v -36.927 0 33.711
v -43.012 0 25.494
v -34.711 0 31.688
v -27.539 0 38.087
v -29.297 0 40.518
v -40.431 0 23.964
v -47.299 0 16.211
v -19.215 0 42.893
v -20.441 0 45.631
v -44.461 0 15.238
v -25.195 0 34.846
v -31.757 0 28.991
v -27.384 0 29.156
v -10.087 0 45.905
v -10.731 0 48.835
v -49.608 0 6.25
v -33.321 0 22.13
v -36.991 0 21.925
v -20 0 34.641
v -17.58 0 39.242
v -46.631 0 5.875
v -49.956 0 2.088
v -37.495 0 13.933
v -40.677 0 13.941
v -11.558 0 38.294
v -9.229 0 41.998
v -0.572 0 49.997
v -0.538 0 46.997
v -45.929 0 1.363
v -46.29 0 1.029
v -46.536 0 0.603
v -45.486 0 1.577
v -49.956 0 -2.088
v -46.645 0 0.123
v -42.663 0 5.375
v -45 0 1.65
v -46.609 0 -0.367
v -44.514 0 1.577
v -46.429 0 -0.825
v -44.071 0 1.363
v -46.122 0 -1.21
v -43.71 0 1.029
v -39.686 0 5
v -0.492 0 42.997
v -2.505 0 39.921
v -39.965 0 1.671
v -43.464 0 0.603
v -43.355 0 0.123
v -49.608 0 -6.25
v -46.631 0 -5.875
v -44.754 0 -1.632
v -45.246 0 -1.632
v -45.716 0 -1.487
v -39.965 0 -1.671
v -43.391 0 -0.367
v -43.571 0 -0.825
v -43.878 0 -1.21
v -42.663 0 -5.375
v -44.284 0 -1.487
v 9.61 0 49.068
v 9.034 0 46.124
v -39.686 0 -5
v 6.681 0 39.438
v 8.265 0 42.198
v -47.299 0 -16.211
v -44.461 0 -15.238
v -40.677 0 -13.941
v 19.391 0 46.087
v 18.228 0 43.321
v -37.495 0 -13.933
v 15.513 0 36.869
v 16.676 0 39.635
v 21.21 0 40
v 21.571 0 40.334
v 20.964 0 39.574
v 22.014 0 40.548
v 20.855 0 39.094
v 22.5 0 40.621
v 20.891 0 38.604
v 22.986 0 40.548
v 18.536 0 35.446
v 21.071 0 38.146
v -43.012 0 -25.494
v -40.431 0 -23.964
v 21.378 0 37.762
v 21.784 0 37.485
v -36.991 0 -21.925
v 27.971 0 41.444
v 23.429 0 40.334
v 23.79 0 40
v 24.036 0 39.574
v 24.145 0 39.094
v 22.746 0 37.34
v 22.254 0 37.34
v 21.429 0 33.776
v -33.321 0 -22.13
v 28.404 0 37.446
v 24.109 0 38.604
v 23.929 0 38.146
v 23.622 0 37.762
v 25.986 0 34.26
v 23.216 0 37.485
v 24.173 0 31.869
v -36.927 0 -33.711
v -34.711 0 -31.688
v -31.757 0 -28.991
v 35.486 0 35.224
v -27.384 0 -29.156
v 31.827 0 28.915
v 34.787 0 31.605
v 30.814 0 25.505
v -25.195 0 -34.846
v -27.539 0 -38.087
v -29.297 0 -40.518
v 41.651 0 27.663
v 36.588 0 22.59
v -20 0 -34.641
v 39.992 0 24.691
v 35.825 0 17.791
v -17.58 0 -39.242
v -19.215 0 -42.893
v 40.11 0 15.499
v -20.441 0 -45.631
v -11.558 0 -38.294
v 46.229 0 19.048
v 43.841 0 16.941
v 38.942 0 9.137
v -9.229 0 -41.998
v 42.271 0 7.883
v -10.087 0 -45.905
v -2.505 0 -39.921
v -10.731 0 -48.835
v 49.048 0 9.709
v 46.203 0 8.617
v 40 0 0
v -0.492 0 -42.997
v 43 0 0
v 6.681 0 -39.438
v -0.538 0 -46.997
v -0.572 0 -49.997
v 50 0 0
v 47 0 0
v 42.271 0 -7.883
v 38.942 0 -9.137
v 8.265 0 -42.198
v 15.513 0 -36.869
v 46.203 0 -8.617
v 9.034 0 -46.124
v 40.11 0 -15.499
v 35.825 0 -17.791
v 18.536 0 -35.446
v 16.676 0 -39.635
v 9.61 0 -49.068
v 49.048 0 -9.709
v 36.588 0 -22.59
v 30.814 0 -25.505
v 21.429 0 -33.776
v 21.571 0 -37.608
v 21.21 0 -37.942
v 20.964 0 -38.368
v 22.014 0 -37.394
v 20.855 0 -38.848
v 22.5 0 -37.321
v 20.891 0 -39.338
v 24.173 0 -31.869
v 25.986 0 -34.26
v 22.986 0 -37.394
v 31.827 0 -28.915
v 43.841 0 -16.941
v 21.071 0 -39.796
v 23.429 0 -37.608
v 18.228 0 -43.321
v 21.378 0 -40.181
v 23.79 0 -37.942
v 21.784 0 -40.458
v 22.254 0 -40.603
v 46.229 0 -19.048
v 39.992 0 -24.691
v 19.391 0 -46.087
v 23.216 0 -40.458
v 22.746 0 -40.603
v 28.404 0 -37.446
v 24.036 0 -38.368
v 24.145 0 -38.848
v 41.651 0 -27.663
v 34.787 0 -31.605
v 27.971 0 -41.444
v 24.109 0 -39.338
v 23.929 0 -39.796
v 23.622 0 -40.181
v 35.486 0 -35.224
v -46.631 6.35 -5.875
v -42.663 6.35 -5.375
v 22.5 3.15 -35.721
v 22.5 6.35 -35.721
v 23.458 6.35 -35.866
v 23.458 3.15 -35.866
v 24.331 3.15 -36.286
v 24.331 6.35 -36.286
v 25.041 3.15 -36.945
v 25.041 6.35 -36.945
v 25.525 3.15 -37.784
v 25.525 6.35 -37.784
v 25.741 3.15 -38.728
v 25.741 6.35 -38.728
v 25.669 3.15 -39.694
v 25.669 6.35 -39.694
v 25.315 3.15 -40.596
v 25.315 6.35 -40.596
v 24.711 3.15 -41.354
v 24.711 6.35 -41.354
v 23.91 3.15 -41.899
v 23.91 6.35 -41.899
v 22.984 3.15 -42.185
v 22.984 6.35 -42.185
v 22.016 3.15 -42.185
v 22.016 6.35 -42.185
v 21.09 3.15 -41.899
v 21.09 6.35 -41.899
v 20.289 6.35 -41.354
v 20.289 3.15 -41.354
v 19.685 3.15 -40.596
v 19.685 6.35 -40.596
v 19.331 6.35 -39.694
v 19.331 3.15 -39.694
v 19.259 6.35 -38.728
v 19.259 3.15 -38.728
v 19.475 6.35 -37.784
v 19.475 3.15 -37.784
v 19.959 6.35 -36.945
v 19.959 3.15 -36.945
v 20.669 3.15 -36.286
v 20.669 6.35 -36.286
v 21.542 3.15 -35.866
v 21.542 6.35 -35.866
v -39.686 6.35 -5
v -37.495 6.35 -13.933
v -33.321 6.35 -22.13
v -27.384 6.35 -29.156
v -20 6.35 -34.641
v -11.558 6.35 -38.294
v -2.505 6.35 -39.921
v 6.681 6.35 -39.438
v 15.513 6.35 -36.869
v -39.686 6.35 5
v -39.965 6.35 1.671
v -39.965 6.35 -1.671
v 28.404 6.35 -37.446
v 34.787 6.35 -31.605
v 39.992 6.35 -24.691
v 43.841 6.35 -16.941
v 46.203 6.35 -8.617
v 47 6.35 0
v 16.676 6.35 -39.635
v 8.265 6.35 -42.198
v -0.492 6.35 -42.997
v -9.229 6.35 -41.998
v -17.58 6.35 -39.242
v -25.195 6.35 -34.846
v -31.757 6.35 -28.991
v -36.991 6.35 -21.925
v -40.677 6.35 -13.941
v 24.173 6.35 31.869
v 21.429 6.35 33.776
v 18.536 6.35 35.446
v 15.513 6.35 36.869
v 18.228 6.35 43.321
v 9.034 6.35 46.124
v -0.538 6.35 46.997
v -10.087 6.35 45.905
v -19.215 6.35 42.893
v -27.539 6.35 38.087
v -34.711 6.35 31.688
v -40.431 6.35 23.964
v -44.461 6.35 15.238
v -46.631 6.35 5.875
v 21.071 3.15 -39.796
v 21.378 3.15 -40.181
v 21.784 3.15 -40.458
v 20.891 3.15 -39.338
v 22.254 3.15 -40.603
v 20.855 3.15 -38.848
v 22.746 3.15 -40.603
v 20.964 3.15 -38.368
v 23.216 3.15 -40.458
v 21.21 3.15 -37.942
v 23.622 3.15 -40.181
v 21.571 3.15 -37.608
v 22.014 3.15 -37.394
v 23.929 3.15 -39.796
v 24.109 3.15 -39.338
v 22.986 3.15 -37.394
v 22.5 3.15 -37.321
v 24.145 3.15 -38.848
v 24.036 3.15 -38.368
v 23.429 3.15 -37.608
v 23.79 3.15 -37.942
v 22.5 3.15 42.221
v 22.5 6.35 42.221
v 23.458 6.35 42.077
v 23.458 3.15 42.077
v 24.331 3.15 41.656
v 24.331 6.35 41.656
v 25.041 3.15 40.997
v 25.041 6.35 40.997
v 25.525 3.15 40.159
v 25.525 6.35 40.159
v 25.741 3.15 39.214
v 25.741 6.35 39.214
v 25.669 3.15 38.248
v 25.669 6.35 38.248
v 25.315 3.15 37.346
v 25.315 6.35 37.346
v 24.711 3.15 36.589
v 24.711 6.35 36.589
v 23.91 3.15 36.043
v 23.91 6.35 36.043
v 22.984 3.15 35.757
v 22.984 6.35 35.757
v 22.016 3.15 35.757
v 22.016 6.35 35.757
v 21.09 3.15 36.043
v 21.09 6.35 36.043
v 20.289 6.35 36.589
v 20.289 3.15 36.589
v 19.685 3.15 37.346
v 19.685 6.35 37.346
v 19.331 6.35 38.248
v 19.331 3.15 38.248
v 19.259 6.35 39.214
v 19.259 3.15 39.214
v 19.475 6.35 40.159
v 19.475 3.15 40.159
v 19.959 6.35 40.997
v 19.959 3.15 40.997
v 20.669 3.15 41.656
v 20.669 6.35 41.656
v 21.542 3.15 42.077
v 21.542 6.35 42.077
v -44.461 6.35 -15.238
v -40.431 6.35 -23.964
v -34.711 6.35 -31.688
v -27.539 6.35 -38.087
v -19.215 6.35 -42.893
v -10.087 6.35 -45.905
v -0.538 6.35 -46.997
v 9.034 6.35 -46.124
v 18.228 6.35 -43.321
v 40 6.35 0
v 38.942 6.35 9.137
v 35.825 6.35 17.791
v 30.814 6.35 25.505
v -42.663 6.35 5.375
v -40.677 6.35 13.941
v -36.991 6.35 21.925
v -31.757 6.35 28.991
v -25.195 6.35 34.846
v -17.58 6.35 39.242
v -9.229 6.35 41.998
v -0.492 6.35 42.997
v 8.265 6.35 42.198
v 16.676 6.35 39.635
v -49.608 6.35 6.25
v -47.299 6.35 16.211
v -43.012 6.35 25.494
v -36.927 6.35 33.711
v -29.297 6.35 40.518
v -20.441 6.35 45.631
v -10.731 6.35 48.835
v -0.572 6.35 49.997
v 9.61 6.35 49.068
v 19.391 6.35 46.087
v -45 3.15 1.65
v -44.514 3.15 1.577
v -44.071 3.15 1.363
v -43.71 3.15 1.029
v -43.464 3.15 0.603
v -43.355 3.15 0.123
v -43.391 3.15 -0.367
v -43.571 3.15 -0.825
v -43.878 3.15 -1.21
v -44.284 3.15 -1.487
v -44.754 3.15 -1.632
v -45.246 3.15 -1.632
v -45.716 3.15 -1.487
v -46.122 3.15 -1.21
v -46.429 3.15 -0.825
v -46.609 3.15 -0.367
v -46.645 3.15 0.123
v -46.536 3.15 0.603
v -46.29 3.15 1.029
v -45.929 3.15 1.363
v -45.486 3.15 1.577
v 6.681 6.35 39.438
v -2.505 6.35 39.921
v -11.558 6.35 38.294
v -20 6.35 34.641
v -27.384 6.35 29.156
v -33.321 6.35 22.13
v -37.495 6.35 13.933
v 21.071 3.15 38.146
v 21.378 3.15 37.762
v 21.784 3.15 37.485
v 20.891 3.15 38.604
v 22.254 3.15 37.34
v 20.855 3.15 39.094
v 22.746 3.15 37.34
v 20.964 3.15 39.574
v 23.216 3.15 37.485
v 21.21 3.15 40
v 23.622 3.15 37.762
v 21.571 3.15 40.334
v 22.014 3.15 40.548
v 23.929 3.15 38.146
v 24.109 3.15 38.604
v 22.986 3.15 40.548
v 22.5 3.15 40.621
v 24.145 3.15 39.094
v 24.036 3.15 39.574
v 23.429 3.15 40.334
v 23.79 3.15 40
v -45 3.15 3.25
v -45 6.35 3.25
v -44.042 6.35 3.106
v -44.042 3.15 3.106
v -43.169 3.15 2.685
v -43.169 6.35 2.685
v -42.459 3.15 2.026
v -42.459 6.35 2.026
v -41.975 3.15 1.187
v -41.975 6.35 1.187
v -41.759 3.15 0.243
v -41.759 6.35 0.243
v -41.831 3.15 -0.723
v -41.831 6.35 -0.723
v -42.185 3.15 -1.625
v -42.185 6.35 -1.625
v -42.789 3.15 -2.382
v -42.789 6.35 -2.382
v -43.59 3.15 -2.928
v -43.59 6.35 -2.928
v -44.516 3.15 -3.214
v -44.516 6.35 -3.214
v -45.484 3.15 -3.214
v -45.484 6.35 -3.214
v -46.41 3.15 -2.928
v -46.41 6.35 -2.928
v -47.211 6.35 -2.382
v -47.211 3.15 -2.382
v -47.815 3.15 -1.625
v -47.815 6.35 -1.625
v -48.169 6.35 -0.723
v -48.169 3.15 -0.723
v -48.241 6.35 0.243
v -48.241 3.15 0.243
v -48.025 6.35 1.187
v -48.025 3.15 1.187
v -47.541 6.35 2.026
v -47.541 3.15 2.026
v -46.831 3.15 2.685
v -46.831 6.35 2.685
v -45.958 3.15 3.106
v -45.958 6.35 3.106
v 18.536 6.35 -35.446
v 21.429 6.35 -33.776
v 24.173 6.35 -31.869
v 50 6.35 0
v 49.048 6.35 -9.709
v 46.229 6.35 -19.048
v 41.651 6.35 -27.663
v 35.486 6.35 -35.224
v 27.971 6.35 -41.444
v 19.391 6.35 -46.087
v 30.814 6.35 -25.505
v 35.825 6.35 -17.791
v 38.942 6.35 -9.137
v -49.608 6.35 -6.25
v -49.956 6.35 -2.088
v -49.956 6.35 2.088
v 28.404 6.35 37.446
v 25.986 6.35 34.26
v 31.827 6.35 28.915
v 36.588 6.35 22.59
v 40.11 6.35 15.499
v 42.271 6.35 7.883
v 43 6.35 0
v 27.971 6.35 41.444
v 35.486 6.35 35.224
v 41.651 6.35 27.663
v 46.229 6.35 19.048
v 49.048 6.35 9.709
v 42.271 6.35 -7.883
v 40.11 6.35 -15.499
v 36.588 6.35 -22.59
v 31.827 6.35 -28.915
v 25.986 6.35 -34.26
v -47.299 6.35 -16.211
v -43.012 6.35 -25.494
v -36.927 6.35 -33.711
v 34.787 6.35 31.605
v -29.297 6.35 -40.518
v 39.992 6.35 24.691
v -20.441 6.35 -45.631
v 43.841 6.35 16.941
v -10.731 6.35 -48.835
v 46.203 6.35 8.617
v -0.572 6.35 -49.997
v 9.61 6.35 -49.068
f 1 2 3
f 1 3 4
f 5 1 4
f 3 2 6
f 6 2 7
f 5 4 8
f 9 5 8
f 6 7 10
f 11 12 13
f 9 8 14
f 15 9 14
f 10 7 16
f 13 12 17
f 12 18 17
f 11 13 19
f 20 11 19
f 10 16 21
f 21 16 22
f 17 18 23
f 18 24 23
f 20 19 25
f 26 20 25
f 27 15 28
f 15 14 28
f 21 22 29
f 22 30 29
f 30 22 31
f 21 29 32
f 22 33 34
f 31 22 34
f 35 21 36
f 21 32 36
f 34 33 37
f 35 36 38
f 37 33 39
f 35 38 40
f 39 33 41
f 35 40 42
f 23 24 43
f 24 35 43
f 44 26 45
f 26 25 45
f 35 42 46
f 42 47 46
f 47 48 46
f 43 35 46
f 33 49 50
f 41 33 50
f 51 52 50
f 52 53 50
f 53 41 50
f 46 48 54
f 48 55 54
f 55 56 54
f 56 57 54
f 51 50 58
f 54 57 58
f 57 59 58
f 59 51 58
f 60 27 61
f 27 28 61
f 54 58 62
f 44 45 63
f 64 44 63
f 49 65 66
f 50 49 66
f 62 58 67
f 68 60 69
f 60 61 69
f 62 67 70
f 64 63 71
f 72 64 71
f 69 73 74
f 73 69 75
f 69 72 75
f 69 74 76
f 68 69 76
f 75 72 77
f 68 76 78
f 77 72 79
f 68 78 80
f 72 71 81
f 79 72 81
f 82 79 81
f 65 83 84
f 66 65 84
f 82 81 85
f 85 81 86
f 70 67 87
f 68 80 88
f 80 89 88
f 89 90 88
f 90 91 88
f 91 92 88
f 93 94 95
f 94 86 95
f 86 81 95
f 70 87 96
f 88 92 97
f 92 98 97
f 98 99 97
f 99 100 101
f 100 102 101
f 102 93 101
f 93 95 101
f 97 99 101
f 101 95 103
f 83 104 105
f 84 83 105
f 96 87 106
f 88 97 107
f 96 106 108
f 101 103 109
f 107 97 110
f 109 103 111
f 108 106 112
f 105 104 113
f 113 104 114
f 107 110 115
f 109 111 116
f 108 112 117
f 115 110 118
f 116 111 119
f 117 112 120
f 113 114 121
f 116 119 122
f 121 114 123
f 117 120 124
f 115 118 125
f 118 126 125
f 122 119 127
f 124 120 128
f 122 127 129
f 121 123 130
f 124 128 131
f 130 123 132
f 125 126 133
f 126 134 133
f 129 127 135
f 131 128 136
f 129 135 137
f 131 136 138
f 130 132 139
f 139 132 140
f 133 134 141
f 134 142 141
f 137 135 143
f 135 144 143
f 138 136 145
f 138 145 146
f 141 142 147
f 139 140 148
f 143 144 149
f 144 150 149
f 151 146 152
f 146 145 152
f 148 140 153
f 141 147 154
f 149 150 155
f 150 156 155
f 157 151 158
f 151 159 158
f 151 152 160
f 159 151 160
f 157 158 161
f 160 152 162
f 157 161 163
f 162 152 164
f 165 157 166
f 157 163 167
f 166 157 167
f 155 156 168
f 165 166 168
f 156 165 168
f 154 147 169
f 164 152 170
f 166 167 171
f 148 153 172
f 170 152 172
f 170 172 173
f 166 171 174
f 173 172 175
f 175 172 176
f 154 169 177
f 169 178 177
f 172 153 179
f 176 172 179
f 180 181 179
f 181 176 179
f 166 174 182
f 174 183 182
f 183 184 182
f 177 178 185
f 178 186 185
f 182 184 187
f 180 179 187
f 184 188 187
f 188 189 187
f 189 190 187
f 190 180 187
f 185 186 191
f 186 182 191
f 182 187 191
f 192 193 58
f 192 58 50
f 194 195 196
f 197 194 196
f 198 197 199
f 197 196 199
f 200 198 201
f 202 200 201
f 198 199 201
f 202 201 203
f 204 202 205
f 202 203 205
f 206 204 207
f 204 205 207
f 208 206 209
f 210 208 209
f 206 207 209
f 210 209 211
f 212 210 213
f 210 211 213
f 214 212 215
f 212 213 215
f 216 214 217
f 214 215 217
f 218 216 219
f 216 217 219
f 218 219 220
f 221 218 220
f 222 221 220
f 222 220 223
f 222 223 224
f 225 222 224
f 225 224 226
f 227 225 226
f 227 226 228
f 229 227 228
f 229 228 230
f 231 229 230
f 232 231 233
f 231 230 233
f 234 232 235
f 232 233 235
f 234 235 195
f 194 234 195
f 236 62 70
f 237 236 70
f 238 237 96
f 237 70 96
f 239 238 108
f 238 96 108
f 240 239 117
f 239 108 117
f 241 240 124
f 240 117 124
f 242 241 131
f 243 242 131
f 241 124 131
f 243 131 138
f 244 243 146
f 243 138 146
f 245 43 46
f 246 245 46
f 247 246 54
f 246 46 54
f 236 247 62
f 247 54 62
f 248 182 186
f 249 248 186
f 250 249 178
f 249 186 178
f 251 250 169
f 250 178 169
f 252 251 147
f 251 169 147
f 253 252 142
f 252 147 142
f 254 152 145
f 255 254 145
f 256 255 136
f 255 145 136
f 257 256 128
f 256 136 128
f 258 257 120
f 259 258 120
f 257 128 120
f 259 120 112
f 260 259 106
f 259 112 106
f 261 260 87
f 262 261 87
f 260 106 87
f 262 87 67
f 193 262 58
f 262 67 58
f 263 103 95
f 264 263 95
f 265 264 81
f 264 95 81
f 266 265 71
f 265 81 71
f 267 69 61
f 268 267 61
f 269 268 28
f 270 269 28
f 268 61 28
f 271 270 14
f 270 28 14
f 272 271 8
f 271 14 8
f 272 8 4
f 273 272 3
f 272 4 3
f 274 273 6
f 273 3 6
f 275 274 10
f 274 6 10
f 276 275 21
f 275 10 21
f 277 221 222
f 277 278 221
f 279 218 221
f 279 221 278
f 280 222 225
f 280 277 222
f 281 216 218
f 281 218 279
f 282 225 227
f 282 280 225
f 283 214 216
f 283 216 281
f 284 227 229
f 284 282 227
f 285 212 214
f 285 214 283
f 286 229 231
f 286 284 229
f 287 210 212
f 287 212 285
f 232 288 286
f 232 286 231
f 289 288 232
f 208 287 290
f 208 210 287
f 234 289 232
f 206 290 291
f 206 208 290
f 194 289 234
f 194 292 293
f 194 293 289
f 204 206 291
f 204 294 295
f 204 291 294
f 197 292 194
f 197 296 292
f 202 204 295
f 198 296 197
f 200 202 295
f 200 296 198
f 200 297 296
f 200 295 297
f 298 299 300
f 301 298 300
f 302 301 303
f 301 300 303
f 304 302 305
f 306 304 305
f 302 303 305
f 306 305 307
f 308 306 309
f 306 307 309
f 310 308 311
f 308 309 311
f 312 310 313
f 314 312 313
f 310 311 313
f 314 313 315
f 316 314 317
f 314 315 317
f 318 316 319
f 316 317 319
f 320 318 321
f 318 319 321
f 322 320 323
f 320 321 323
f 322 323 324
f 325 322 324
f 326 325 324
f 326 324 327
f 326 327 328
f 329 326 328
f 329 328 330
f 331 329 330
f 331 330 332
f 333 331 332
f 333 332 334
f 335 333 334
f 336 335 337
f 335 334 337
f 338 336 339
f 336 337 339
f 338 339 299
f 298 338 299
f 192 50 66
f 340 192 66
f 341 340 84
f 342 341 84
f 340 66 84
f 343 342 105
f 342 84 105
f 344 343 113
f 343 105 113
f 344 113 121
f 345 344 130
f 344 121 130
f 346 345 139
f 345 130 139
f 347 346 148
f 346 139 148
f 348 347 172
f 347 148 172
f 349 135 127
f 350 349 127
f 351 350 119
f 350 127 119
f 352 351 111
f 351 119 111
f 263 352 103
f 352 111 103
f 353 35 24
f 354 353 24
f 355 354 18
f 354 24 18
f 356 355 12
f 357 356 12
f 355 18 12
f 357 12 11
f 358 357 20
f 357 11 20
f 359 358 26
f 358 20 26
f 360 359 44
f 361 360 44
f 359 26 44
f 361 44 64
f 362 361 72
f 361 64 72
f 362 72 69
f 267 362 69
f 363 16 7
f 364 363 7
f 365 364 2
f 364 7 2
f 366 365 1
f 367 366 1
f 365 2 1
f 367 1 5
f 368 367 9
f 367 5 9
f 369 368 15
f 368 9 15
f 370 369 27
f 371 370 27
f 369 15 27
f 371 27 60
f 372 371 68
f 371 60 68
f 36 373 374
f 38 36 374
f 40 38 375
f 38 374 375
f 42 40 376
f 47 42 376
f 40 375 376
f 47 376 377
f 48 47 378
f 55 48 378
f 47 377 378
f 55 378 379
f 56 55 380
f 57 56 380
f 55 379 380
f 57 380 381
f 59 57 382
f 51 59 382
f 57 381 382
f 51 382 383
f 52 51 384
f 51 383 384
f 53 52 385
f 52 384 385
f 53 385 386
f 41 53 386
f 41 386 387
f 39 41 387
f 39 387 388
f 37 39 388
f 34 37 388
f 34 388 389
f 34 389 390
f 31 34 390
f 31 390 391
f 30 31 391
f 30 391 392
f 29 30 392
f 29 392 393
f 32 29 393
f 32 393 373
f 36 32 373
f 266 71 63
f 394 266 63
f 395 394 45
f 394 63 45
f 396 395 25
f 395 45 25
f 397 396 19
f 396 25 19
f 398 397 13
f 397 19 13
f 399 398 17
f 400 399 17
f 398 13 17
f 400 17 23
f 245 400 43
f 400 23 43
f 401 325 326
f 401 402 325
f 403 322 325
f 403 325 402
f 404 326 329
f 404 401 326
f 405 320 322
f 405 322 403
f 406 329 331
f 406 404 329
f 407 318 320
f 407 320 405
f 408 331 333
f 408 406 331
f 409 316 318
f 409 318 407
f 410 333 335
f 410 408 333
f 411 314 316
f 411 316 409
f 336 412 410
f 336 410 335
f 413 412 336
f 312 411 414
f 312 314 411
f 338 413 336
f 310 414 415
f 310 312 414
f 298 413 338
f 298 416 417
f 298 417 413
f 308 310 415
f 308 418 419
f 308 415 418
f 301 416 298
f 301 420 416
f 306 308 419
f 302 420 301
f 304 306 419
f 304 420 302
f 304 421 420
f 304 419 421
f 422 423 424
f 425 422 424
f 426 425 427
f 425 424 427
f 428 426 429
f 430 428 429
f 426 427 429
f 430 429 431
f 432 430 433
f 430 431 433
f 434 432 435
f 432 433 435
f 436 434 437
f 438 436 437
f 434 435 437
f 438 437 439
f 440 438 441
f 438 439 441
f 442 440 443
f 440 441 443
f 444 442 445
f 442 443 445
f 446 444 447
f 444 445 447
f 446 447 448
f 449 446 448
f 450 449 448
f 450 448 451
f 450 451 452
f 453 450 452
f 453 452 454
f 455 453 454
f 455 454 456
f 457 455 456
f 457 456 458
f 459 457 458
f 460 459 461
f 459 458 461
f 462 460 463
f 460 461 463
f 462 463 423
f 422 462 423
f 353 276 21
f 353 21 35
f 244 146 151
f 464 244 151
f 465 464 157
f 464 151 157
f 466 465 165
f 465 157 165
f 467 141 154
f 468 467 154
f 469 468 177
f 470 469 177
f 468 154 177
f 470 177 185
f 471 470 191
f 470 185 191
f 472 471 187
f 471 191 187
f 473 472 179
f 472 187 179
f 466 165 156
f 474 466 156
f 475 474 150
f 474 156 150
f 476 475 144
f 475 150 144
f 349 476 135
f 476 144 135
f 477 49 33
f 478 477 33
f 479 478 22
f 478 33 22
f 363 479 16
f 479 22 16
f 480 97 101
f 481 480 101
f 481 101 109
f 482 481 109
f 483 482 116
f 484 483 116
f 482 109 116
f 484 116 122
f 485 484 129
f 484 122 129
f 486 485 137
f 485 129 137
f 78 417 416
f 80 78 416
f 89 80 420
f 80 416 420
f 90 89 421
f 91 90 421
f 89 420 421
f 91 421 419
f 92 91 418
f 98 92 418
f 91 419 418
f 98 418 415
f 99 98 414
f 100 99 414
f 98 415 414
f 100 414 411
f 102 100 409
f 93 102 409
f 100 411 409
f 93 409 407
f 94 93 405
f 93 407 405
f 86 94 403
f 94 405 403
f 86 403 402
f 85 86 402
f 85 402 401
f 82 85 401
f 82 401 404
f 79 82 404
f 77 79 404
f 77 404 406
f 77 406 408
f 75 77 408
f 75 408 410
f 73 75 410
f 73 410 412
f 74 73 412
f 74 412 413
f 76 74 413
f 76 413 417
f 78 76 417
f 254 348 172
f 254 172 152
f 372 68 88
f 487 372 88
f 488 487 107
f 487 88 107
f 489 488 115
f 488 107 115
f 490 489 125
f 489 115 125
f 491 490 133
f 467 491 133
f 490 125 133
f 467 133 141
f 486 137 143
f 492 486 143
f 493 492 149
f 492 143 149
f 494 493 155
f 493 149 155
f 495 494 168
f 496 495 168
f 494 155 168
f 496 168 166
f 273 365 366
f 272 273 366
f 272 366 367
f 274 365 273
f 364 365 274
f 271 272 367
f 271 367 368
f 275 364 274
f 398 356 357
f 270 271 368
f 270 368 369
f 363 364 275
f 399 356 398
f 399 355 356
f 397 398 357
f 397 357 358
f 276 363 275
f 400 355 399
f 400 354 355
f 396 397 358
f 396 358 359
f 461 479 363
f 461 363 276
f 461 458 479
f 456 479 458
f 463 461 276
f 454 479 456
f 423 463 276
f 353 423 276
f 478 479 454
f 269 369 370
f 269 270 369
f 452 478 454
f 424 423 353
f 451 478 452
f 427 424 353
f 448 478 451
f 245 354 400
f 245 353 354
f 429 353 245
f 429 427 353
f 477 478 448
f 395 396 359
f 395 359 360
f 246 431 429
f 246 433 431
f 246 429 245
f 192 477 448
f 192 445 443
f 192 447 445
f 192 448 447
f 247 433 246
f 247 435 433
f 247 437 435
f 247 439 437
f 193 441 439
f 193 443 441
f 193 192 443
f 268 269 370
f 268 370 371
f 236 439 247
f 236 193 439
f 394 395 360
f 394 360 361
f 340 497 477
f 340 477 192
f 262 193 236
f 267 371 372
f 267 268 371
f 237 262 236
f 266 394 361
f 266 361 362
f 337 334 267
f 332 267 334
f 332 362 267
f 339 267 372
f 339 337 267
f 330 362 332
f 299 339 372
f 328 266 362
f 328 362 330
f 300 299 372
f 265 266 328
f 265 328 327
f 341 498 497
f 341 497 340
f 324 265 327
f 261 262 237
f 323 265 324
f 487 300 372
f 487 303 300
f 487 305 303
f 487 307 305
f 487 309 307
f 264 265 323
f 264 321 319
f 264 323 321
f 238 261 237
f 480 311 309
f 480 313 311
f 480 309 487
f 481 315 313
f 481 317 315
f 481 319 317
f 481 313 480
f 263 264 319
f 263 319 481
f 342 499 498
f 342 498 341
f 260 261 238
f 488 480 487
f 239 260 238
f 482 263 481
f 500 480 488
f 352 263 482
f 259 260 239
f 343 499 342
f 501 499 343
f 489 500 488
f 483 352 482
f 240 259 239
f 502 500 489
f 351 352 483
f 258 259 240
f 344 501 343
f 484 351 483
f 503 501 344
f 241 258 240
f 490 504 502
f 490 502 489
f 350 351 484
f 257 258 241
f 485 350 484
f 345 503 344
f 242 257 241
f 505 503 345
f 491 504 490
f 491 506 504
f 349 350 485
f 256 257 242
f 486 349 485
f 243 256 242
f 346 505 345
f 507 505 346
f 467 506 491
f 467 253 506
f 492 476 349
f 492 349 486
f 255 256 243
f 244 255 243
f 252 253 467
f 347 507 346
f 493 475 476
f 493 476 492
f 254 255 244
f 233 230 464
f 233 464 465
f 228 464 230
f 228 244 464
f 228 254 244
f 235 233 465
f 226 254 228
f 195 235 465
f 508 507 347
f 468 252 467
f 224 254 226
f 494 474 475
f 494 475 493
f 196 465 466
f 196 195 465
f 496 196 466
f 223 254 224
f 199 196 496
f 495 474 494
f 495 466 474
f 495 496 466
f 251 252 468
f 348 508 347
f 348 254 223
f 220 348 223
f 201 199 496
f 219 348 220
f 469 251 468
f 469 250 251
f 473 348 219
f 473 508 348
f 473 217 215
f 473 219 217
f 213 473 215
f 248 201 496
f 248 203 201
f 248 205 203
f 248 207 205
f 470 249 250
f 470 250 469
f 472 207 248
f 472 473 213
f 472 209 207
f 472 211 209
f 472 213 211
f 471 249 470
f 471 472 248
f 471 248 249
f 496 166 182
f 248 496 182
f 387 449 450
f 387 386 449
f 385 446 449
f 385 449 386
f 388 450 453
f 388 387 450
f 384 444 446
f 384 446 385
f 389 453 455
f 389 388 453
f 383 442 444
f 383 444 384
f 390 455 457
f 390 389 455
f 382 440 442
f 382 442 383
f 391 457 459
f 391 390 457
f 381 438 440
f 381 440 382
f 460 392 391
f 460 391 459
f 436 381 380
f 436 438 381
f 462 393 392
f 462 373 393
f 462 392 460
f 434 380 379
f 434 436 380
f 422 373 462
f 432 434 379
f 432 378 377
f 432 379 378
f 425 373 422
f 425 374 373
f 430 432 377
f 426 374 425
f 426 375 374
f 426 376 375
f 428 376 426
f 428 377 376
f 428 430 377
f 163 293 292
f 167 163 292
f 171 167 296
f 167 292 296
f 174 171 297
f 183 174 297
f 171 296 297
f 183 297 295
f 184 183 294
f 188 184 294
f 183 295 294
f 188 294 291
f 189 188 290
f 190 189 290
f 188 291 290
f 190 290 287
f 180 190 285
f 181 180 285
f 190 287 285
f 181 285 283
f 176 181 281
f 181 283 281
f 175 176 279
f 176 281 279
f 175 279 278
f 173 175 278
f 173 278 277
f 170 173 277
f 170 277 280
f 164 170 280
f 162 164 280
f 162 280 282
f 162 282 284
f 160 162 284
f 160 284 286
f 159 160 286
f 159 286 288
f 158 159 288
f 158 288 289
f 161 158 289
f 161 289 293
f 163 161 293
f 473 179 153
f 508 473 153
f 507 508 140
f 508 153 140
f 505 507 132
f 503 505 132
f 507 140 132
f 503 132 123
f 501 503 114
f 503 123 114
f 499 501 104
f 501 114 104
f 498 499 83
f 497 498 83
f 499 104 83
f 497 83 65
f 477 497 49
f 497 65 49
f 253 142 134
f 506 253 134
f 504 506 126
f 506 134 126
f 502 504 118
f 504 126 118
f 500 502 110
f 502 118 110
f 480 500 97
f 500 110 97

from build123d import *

# Parameters (mm, degrees)
BOSS_EXTRUDE1_DEPTH = 6.35
M3_HOLES_REACH      = 72.995
SKETCH2_R           = 1.65
SKETCH3_R           = 3.25
CUT_EXTRUDE1_DEPTH  = 3.2


with BuildPart() as part:
    # Sketch1 → Boss-Extrude1 (new body)
    with BuildSketch(Plane(origin=(0, 0, 0), x_dir=(1, 0, 0), z_dir=(0, 1, 0))):
        with BuildLine():
            ThreePointArc((50, 0), (44.781853835, 22.239279825), (30.216577315, 39.83664714))
            Line((30.216577315, 39.83664714), (28.403582676, 37.446448312))
            ThreePointArc((28.403582676, 37.446448312), (42.094942605, 20.904923035), (47, 0))
            ThreePointArc((47, 0), (42.094942605, -20.904923035), (28.403582676, -37.446448312))
            Line((28.403582676, -37.446448312), (30.216577315, -39.83664714))
            ThreePointArc((30.216577315, -39.83664714), (44.781853835, -22.239279825), (50, 0))
        make_face()
        with BuildLine():
            ThreePointArc((43, 0), (38.512394298, 19.125780649), (25.986256491, 34.259516541))
            Line((25.986256491, 34.259516541), (24.173261852, 31.869317712))
            ThreePointArc((24.173261852, 31.869317712), (35.825483068, 17.79142386), (40, 0))
            ThreePointArc((40, 0), (35.825483068, -17.79142386), (24.173261852, -31.869317712))
            Line((24.173261852, -31.869317712), (25.986256491, -34.259516541))
            ThreePointArc((25.986256491, -34.259516541), (38.512394298, -19.125780649), (43, 0))
        make_face()
        with BuildLine():
            ThreePointArc((16.6764834, -39.634516541), (21.5, -37.239092363), (25.986256491, -34.259516541))
            Line((25.986256491, -34.259516541), (24.173261852, -31.869317712))
            ThreePointArc((24.173261852, -31.869317712), (20, -34.641016151), (15.513007814, -36.869317712))
            Line((15.513007814, -36.869317712), (16.6764834, -39.634516541))
        make_face()
        with BuildLine():
            ThreePointArc((18.227784182, -43.321448312), (23.5, -40.703193978), (28.403582676, -37.446448312))
            Line((28.403582676, -37.446448312), (25.986256491, -34.259516541))
            ThreePointArc((25.986256491, -34.259516541), (21.5, -37.239092363), (16.6764834, -39.634516541))
            Line((16.6764834, -39.634516541), (18.227784182, -43.321448312))
        make_face()
        with BuildLine():
            ThreePointArc((19.391259768, -46.08664714), (25, -43.301270189), (30.216577315, -39.83664714))
            Line((30.216577315, -39.83664714), (28.403582676, -37.446448312))
            ThreePointArc((28.403582676, -37.446448312), (23.5, -40.703193978), (18.227784182, -43.321448312))
            Line((18.227784182, -43.321448312), (19.391259768, -46.08664714))
        make_face()
        with BuildLine():
            ThreePointArc((-49.607837082, -6.25), (-25, -43.301270189), (19.391259768, -46.08664714))
            Line((19.391259768, -46.08664714), (18.227784182, -43.321448312))
            ThreePointArc((18.227784182, -43.321448312), (-23.5, -40.703193978), (-46.631366858, -5.875))
            Line((-46.631366858, -5.875), (-49.607837082, -6.25))
        make_face()
        with BuildLine():
            ThreePointArc((-42.662739891, -5.375), (-21.5, -37.239092363), (16.6764834, -39.634516541))
            Line((16.6764834, -39.634516541), (15.513007814, -36.869317712))
            ThreePointArc((15.513007814, -36.869317712), (-20, -34.641016151), (-39.686269666, -5))
            Line((-39.686269666, -5), (-42.662739891, -5.375))
        make_face()
        with BuildLine():
            Line((-39.686269666, 5), (-42.662739891, 5.375))
            ThreePointArc((-42.662739891, 5.375), (-43, 0), (-42.662739891, -5.375))
            Line((-42.662739891, -5.375), (-39.686269666, -5))
            ThreePointArc((-39.686269666, -5), (-40, 0), (-39.686269666, 5))
        make_face()
        with BuildLine():
            Line((-42.662739891, 5.375), (-46.631366858, 5.875))
            ThreePointArc((-46.631366858, 5.875), (-47, 0), (-46.631366858, -5.875))
            Line((-46.631366858, -5.875), (-42.662739891, -5.375))
            ThreePointArc((-42.662739891, -5.375), (-43, 0), (-42.662739891, 5.375))
        make_face()
        with BuildLine():
            Line((-46.631366858, 5.875), (-49.607837082, 6.25))
            ThreePointArc((-49.607837082, 6.25), (-50, 0), (-49.607837082, -6.25))
            Line((-49.607837082, -6.25), (-46.631366858, -5.875))
            ThreePointArc((-46.631366858, -5.875), (-47, 0), (-46.631366858, 5.875))
        make_face()
        with BuildLine():
            Line((18.227784182, 43.321448312), (19.391259768, 46.08664714))
            ThreePointArc((19.391259768, 46.08664714), (-25, 43.301270189), (-49.607837082, 6.25))
            Line((-49.607837082, 6.25), (-46.631366858, 5.875))
            ThreePointArc((-46.631366858, 5.875), (-23.5, 40.703193978), (18.227784182, 43.321448312))
        make_face()
        with BuildLine():
            Line((15.513007814, 36.869317712), (16.6764834, 39.634516541))
            ThreePointArc((16.6764834, 39.634516541), (-21.5, 37.239092363), (-42.662739891, 5.375))
            Line((-42.662739891, 5.375), (-39.686269666, 5))
            ThreePointArc((-39.686269666, 5), (-20, 34.641016151), (15.513007814, 36.869317712))
        make_face()
        with BuildLine():
            Line((24.173261852, 31.869317712), (25.986256491, 34.259516541))
            ThreePointArc((25.986256491, 34.259516541), (21.5, 37.239092363), (16.6764834, 39.634516541))
            Line((16.6764834, 39.634516541), (15.513007814, 36.869317712))
            ThreePointArc((15.513007814, 36.869317712), (20, 34.641016151), (24.173261852, 31.869317712))
        make_face()
        with BuildLine():
            Line((25.986256491, 34.259516541), (28.403582676, 37.446448312))
            ThreePointArc((28.403582676, 37.446448312), (23.5, 40.703193978), (18.227784182, 43.321448312))
            Line((18.227784182, 43.321448312), (16.6764834, 39.634516541))
            ThreePointArc((16.6764834, 39.634516541), (21.5, 37.239092363), (25.986256491, 34.259516541))
        make_face()
        with BuildLine():
            Line((28.403582676, 37.446448312), (30.216577315, 39.83664714))
            ThreePointArc((30.216577315, 39.83664714), (25, 43.301270189), (19.391259768, 46.08664714))
            Line((19.391259768, 46.08664714), (18.227784182, 43.321448312))
            ThreePointArc((18.227784182, 43.321448312), (23.5, 40.703193978), (28.403582676, 37.446448312))
        make_face()
    extrude(amount=BOSS_EXTRUDE1_DEPTH)

    # Sketch2 → M3-holes (cut, up to next)
    with BuildSketch(Plane(origin=(0, 6.35, 0), x_dir=(1, 0, 0), z_dir=(0, 1, 0)), mode=Mode.PRIVATE) as m3_holes_sk1:
        with Locations(Location((-45, 0, 0), (0, 0, 270))):
            Circle(SKETCH2_R)
    m3_holes_tool1 = extrude(m3_holes_sk1.sketch, amount=-M3_HOLES_REACH, mode=Mode.PRIVATE) & part.part
    # Sketch2 → M3-holes (cut, up to next)
    with BuildSketch(Plane(origin=(0, 6.35, 0), x_dir=(1, 0, 0), z_dir=(0, 1, 0)), mode=Mode.PRIVATE) as m3_holes_sk2:
        with Locations(Location((22.5, -38.97114317, 0), (0, 0, 270))):
            Circle(SKETCH2_R)
    m3_holes_tool2 = extrude(m3_holes_sk2.sketch, amount=-M3_HOLES_REACH, mode=Mode.PRIVATE) & part.part
    # Sketch2 → M3-holes (cut, up to next)
    with BuildSketch(Plane(origin=(0, 6.35, 0), x_dir=(1, 0, 0), z_dir=(0, 1, 0)), mode=Mode.PRIVATE) as m3_holes_sk3:
        with Locations(Location((22.5, 38.97114317, 0), (0, 0, 270))):
            Circle(SKETCH2_R)
    m3_holes_tool3 = extrude(m3_holes_sk3.sketch, amount=-M3_HOLES_REACH, mode=Mode.PRIVATE) & part.part
    add(m3_holes_tool1.solids().sort_by_distance((-45, 6.35, 0))[0], mode=Mode.SUBTRACT)
    add(m3_holes_tool2.solids().sort_by_distance((22.5, 6.35, 38.971143))[0], mode=Mode.SUBTRACT)
    add(m3_holes_tool3.solids().sort_by_distance((22.5, 6.35, -38.971143))[0], mode=Mode.SUBTRACT)

    # Sketch3 → Cut-Extrude1 (cut)
    with BuildSketch(Plane(origin=(0, 6.35, 0), x_dir=(1, 0, 0), z_dir=(0, 1, 0))):
        with Locations(Location((-45, 0, 0), (0, 0, 270))):
            Circle(SKETCH3_R)
        with Locations(Location((22.5, 38.97114317, 0), (0, 0, 270))):
            Circle(SKETCH3_R)
        with Locations(Location((22.5, -38.97114317, 0), (0, 0, 270))):
            Circle(SKETCH3_R)
    extrude(amount=-CUT_EXTRUDE1_DEPTH, mode=Mode.SUBTRACT)


solid = part.part
